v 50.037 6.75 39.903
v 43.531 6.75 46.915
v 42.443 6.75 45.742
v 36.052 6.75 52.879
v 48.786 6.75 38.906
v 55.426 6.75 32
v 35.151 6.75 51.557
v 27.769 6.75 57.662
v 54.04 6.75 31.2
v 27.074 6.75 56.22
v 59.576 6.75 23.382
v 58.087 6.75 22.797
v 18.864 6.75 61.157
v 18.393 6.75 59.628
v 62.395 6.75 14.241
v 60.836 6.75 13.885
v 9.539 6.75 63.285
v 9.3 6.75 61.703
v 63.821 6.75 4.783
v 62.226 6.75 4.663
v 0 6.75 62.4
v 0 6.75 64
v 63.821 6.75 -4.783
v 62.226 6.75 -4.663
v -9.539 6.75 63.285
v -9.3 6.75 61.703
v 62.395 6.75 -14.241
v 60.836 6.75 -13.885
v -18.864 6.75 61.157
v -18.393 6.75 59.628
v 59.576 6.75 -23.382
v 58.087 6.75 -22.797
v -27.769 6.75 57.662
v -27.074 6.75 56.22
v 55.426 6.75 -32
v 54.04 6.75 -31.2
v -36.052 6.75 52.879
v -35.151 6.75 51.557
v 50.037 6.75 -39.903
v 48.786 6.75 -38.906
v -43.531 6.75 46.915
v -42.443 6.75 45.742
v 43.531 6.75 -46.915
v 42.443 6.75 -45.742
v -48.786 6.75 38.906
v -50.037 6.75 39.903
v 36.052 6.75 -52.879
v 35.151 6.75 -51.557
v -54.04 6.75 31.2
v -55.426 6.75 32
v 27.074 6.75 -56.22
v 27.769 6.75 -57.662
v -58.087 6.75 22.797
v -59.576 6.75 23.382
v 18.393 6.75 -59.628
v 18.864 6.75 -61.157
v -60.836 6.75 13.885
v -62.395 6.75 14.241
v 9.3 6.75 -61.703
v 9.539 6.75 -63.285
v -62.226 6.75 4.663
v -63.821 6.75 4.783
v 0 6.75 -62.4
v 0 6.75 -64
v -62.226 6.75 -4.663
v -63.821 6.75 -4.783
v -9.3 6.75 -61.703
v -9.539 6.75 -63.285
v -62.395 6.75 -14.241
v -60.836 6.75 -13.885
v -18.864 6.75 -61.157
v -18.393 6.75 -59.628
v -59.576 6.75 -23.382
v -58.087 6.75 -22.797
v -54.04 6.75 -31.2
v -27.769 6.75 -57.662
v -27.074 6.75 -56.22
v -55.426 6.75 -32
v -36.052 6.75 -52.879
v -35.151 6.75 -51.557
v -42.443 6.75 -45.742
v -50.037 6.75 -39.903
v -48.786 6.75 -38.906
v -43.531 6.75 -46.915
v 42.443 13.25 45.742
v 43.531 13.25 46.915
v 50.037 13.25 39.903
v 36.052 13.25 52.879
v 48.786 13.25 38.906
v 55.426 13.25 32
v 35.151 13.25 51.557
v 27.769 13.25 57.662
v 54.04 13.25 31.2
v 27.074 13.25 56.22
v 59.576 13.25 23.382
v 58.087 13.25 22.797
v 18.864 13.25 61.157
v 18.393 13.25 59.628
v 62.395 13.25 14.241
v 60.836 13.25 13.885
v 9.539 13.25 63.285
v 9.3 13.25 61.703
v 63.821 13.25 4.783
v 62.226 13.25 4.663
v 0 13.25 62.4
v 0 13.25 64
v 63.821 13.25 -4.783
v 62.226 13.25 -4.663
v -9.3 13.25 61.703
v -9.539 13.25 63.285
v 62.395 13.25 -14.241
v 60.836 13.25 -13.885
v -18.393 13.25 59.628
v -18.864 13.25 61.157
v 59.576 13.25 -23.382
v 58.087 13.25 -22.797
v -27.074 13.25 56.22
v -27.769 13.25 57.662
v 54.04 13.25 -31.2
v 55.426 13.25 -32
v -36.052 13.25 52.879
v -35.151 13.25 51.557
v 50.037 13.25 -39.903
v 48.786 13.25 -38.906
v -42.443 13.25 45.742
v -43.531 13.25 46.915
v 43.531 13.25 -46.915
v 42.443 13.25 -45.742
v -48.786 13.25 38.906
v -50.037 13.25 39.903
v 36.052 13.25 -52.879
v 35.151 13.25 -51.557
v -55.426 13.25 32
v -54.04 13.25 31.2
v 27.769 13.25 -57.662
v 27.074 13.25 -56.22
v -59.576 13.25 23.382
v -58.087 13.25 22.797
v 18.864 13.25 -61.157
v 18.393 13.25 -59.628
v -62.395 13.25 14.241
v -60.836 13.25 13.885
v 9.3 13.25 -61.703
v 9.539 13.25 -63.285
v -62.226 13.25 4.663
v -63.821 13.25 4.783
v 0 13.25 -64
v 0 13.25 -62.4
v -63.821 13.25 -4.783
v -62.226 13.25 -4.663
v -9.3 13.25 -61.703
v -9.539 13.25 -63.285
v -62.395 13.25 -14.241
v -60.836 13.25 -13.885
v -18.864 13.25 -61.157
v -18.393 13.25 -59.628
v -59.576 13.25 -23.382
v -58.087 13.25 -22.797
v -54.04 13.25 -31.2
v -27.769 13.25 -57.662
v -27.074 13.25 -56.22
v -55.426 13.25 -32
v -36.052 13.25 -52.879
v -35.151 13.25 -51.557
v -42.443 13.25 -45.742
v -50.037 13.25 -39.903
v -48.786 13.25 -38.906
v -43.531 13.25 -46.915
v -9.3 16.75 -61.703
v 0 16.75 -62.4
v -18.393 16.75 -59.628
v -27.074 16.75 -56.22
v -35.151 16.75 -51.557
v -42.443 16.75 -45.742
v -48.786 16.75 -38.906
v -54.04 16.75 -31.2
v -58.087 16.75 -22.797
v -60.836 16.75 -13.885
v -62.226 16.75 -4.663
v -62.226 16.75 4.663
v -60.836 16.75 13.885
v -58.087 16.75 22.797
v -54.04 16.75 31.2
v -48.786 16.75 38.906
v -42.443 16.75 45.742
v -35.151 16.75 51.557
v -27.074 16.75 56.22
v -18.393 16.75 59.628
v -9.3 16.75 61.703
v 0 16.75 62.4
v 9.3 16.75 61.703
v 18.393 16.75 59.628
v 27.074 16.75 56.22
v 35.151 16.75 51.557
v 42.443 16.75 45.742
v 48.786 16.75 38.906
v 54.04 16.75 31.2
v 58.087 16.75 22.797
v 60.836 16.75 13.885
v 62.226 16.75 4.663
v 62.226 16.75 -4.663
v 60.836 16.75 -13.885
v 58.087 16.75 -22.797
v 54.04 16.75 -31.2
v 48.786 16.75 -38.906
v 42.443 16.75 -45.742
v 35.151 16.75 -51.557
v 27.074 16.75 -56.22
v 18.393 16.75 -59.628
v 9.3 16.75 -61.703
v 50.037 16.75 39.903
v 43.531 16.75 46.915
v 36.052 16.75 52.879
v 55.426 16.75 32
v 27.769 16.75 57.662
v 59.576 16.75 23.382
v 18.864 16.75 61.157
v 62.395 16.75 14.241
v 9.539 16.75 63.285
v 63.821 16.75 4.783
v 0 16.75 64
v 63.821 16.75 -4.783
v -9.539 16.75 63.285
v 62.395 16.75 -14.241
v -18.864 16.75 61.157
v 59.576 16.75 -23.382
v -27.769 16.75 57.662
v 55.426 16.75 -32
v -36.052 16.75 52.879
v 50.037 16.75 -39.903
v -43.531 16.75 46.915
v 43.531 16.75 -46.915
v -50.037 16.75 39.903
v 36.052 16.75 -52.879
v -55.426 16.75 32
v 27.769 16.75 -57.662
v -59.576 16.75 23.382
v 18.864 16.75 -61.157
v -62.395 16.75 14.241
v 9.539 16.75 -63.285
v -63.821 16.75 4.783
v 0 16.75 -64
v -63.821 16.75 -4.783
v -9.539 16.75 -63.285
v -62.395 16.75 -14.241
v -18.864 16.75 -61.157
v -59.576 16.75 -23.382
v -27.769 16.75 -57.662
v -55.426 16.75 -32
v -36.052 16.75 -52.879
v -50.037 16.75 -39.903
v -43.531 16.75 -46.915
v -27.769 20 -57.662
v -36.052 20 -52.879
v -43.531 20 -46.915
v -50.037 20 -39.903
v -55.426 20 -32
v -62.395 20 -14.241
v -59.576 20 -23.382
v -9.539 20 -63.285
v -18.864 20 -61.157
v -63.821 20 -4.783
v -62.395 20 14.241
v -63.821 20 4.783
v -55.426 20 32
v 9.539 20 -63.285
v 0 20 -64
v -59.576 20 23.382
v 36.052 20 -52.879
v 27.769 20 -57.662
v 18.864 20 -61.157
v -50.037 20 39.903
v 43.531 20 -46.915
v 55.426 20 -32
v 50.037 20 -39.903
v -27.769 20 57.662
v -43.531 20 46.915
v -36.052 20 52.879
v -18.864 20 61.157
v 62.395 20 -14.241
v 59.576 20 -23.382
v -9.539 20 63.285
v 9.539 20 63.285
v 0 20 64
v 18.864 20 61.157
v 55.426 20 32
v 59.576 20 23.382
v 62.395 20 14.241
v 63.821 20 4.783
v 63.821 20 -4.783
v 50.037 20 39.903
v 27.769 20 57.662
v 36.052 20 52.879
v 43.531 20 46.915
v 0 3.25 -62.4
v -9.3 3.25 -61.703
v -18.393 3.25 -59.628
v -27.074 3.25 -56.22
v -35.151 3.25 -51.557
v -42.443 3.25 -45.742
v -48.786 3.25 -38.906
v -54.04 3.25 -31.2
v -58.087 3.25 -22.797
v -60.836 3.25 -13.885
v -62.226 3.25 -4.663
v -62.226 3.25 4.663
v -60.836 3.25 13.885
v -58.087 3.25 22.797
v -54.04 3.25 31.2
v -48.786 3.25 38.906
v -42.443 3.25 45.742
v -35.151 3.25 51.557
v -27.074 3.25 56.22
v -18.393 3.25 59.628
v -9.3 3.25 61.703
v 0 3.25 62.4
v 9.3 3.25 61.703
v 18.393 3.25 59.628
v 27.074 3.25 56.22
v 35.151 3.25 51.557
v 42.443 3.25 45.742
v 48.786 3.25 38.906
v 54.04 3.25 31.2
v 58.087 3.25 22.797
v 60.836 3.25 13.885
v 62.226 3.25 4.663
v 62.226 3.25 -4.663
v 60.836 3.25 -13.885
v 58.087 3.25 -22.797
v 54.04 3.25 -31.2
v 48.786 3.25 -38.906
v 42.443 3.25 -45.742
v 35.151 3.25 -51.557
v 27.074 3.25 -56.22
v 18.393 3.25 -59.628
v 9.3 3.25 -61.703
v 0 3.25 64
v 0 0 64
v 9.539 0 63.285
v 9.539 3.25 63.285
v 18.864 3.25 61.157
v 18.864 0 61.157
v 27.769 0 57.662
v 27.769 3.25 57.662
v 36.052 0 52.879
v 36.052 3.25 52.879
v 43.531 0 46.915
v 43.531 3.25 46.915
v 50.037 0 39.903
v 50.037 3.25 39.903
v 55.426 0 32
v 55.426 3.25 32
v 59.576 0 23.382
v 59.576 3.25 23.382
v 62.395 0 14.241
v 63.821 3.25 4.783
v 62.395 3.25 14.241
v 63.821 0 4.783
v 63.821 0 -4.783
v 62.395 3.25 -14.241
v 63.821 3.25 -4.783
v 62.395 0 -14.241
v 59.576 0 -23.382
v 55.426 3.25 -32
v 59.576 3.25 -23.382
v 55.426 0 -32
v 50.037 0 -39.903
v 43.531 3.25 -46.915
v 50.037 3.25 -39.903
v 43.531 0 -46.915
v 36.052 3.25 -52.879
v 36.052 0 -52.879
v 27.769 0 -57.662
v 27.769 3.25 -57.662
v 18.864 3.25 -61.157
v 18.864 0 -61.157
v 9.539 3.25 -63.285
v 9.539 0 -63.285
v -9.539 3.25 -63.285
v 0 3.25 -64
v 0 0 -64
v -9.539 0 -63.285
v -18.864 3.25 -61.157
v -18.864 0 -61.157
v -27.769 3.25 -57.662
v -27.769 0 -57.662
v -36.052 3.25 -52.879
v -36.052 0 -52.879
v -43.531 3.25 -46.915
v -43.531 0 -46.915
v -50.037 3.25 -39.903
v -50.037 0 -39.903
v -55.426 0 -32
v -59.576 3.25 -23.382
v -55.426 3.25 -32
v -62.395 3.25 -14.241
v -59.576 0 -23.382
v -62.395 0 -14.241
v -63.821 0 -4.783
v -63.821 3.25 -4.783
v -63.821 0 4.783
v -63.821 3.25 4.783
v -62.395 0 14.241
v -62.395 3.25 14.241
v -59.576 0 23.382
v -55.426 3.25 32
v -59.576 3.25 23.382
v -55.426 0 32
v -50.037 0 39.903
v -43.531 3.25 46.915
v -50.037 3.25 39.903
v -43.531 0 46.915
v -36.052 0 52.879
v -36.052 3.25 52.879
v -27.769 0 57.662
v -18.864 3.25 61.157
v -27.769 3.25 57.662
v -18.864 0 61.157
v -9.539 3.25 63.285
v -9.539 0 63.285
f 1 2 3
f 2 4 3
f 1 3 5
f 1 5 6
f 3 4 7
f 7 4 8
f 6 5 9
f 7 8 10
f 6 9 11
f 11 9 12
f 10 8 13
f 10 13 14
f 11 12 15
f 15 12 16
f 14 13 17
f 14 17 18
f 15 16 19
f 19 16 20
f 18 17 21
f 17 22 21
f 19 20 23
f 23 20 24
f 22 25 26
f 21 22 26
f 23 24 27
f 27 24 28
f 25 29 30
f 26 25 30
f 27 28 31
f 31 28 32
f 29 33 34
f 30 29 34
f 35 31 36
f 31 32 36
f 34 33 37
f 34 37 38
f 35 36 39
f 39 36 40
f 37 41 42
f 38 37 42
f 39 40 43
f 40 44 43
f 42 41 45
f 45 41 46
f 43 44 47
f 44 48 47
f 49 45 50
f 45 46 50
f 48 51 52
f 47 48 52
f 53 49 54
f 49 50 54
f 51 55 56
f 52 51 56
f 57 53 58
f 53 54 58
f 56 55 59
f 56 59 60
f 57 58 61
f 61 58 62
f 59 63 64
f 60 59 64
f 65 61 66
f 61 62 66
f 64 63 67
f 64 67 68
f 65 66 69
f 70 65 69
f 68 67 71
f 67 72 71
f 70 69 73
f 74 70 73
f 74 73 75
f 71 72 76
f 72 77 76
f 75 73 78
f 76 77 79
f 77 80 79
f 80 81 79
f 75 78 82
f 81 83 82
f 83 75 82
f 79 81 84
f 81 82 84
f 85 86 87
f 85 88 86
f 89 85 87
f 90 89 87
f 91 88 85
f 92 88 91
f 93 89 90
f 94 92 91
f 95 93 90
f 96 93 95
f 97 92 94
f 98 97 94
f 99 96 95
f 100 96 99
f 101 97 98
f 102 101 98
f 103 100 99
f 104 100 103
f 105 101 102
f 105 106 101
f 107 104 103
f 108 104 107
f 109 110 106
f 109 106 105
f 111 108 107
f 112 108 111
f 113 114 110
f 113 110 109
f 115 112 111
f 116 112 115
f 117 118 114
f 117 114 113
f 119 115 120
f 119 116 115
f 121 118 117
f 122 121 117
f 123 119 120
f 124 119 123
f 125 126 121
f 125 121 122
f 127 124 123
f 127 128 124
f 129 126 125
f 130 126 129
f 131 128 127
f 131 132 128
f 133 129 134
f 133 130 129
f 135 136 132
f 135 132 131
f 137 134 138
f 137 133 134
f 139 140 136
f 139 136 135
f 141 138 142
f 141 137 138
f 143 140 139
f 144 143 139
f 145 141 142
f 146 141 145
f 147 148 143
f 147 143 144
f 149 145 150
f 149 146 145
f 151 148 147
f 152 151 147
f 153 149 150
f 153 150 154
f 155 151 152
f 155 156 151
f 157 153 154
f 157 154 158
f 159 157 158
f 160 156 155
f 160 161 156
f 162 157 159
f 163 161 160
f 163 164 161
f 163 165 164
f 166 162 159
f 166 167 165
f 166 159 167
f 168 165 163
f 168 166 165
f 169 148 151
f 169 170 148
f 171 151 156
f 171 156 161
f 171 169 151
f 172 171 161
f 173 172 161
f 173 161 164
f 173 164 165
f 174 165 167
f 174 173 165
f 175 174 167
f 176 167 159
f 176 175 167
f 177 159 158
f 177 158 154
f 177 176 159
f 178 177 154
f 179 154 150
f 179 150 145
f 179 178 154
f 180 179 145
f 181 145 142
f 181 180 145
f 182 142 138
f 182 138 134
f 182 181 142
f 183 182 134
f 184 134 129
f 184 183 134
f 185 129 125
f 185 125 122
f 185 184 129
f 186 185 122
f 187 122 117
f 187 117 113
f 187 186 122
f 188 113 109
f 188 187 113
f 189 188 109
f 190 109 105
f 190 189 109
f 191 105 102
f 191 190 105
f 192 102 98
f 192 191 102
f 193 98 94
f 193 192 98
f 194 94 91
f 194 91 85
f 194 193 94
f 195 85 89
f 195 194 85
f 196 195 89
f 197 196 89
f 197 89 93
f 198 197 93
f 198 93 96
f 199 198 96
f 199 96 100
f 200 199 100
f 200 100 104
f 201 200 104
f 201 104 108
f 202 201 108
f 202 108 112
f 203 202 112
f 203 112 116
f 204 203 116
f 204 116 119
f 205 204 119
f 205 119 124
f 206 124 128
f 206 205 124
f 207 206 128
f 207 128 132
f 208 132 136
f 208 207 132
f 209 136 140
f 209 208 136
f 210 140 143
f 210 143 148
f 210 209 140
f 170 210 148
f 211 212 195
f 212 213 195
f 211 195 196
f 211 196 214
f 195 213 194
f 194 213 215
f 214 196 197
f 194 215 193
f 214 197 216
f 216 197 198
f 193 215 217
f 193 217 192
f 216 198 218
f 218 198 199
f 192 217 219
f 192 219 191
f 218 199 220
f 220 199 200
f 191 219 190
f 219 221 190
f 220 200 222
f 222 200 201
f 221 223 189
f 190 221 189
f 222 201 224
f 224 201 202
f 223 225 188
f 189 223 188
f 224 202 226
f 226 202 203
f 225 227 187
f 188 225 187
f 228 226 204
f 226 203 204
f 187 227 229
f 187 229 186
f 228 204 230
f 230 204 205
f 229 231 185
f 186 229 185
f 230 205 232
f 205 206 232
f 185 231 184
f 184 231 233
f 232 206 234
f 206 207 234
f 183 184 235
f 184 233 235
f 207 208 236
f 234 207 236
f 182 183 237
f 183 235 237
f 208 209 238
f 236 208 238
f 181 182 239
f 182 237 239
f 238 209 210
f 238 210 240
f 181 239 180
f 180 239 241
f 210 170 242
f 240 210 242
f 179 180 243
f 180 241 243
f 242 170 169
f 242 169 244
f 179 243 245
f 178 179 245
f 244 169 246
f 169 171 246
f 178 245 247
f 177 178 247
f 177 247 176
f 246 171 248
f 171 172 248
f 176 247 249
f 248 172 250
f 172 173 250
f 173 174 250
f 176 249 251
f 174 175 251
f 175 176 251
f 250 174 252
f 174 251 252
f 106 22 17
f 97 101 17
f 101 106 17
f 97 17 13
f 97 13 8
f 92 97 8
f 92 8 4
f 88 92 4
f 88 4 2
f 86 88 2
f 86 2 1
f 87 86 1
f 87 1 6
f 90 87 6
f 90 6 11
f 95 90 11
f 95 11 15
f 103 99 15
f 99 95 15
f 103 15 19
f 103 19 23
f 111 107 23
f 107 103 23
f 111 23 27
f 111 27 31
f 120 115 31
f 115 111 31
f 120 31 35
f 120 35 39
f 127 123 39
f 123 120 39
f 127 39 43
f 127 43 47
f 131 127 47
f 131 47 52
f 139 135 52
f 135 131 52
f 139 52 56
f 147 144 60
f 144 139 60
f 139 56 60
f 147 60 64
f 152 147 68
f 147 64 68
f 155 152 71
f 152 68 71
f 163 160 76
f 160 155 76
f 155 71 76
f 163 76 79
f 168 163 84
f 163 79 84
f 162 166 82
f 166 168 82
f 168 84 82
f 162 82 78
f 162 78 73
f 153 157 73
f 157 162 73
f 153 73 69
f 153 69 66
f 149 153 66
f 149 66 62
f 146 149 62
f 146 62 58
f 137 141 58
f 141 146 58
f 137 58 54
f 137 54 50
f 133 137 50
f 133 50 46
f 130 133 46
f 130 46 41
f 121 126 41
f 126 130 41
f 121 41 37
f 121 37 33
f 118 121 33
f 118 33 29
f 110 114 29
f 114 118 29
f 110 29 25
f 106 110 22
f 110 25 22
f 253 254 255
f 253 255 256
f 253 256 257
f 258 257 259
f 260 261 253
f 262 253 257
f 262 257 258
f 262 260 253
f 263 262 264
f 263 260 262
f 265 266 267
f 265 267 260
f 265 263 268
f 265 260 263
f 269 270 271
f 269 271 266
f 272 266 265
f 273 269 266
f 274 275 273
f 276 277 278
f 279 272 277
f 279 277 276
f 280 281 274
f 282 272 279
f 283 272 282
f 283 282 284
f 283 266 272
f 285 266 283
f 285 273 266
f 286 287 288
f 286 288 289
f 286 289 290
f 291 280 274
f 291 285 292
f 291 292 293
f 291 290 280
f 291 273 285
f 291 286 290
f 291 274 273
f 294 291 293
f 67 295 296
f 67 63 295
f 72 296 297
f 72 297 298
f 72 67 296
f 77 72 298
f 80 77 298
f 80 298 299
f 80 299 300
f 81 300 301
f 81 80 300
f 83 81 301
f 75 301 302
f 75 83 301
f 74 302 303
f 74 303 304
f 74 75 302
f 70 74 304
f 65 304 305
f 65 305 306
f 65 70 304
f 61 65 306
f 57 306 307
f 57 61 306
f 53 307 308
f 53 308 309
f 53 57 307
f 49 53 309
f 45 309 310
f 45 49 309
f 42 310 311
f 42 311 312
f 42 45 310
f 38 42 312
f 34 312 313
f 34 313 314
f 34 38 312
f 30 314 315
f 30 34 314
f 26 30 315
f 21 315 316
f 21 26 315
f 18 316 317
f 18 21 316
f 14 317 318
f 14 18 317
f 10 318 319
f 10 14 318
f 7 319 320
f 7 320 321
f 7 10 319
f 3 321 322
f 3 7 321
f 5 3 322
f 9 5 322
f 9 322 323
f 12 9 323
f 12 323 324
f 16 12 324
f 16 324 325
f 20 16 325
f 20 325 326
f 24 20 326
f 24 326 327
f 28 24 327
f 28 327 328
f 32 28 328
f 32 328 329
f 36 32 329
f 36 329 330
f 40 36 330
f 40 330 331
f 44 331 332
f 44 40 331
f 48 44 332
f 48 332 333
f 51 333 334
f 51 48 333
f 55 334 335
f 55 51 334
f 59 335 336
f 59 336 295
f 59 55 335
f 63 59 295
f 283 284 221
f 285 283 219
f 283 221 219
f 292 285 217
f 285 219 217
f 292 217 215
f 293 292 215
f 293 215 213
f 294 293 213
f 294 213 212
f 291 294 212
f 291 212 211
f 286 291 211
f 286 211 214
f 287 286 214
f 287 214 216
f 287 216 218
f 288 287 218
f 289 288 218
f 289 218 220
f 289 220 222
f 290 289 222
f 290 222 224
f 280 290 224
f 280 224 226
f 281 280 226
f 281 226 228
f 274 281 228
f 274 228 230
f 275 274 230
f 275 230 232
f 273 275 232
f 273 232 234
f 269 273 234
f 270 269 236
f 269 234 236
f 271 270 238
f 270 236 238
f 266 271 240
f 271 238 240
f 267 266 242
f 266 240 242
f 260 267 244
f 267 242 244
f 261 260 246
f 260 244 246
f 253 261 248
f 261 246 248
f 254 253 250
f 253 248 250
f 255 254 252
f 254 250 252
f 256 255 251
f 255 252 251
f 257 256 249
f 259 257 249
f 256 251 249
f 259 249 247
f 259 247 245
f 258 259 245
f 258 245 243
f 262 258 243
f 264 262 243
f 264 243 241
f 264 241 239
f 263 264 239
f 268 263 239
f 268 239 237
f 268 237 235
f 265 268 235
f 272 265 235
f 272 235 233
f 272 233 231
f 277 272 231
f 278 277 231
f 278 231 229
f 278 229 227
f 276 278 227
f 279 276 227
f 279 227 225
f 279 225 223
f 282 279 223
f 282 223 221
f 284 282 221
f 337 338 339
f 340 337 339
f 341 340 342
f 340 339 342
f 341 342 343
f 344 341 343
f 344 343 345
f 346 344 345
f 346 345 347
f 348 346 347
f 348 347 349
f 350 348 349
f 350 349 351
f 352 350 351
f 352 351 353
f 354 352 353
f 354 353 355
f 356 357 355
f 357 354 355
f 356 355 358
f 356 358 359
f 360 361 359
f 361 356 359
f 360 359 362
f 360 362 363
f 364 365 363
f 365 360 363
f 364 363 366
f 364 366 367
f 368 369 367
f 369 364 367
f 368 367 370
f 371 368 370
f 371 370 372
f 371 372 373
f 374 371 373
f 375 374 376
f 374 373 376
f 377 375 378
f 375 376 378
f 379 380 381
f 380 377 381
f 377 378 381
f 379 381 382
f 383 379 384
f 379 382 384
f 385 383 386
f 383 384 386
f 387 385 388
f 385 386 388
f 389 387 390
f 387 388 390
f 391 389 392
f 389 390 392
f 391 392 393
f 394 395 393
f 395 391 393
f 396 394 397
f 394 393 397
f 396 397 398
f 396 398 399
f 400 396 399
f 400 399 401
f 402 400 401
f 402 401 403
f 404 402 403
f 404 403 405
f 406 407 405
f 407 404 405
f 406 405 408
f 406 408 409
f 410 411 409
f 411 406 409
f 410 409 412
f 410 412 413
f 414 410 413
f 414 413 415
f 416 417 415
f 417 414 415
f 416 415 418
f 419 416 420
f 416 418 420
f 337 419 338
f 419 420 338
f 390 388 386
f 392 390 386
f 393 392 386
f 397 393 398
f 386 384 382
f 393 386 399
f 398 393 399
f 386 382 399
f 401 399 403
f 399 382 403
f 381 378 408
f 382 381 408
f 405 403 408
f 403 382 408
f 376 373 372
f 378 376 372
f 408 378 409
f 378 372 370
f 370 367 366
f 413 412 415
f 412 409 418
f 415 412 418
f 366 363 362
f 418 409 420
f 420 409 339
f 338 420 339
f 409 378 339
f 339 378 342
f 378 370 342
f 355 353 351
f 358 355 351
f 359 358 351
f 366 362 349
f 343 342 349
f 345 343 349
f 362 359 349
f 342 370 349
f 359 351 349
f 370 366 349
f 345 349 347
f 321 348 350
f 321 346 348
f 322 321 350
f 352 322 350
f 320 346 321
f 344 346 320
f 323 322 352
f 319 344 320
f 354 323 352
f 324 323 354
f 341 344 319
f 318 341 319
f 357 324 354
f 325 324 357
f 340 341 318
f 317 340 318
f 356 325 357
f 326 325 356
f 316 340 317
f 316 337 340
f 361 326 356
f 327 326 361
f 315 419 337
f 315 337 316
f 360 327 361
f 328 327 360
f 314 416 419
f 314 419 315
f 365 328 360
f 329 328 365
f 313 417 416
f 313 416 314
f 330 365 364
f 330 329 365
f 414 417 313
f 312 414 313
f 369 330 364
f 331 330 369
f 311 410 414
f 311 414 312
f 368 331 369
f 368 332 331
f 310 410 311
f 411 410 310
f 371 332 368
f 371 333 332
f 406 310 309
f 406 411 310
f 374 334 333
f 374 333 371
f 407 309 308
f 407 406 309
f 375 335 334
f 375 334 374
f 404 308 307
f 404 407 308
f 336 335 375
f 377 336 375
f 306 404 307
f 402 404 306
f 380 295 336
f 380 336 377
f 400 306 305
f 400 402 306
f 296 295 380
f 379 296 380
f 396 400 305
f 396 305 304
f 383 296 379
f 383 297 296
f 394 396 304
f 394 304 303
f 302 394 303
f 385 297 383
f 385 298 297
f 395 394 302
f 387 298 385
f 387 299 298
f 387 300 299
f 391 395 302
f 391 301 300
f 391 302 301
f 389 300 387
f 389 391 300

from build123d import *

# Parameters (mm, degrees)
SZKIC1_R                    = 64
DODANIE_WYCI_GNI_CIE1_DEPTH = 20
SZKIC3_W                    = 1.6
SZKIC3_H                    = 3.5


with BuildPart() as part:
    # Szkic1 → Dodanie-wyciągnięcie1 (new body)
    with BuildSketch(Plane(origin=(0, 0, 0), x_dir=(1, 0, 0), z_dir=(0, 1, 0))):
        with Locations(Location((0, 0, 0), (0, 0, 270))):
            Circle(SZKIC1_R)
    extrude(amount=DODANIE_WYCI_GNI_CIE1_DEPTH)

    # Szkic3 → Wycięcie-obrót1 (revolve, cut)
    with BuildSketch(Plane(origin=(0, 0, 0), x_dir=(0, 0, -1), z_dir=(1, 0, 0)), mode=Mode.PRIVATE) as wyci_cie_obr_t1_sk:
        with Locations((-63.2, 15)):
            Rectangle(SZKIC3_W, SZKIC3_H)
        with Locations((-63.2, 5)):
            Rectangle(SZKIC3_W, SZKIC3_H)
    revolve(wyci_cie_obr_t1_sk.sketch.rotate(Axis((0, 0, 0), (0, 1, 0)), 180), axis=Axis((0, 0, 0), (0, 1, 0)), mode=Mode.SUBTRACT)


solid = part.part
